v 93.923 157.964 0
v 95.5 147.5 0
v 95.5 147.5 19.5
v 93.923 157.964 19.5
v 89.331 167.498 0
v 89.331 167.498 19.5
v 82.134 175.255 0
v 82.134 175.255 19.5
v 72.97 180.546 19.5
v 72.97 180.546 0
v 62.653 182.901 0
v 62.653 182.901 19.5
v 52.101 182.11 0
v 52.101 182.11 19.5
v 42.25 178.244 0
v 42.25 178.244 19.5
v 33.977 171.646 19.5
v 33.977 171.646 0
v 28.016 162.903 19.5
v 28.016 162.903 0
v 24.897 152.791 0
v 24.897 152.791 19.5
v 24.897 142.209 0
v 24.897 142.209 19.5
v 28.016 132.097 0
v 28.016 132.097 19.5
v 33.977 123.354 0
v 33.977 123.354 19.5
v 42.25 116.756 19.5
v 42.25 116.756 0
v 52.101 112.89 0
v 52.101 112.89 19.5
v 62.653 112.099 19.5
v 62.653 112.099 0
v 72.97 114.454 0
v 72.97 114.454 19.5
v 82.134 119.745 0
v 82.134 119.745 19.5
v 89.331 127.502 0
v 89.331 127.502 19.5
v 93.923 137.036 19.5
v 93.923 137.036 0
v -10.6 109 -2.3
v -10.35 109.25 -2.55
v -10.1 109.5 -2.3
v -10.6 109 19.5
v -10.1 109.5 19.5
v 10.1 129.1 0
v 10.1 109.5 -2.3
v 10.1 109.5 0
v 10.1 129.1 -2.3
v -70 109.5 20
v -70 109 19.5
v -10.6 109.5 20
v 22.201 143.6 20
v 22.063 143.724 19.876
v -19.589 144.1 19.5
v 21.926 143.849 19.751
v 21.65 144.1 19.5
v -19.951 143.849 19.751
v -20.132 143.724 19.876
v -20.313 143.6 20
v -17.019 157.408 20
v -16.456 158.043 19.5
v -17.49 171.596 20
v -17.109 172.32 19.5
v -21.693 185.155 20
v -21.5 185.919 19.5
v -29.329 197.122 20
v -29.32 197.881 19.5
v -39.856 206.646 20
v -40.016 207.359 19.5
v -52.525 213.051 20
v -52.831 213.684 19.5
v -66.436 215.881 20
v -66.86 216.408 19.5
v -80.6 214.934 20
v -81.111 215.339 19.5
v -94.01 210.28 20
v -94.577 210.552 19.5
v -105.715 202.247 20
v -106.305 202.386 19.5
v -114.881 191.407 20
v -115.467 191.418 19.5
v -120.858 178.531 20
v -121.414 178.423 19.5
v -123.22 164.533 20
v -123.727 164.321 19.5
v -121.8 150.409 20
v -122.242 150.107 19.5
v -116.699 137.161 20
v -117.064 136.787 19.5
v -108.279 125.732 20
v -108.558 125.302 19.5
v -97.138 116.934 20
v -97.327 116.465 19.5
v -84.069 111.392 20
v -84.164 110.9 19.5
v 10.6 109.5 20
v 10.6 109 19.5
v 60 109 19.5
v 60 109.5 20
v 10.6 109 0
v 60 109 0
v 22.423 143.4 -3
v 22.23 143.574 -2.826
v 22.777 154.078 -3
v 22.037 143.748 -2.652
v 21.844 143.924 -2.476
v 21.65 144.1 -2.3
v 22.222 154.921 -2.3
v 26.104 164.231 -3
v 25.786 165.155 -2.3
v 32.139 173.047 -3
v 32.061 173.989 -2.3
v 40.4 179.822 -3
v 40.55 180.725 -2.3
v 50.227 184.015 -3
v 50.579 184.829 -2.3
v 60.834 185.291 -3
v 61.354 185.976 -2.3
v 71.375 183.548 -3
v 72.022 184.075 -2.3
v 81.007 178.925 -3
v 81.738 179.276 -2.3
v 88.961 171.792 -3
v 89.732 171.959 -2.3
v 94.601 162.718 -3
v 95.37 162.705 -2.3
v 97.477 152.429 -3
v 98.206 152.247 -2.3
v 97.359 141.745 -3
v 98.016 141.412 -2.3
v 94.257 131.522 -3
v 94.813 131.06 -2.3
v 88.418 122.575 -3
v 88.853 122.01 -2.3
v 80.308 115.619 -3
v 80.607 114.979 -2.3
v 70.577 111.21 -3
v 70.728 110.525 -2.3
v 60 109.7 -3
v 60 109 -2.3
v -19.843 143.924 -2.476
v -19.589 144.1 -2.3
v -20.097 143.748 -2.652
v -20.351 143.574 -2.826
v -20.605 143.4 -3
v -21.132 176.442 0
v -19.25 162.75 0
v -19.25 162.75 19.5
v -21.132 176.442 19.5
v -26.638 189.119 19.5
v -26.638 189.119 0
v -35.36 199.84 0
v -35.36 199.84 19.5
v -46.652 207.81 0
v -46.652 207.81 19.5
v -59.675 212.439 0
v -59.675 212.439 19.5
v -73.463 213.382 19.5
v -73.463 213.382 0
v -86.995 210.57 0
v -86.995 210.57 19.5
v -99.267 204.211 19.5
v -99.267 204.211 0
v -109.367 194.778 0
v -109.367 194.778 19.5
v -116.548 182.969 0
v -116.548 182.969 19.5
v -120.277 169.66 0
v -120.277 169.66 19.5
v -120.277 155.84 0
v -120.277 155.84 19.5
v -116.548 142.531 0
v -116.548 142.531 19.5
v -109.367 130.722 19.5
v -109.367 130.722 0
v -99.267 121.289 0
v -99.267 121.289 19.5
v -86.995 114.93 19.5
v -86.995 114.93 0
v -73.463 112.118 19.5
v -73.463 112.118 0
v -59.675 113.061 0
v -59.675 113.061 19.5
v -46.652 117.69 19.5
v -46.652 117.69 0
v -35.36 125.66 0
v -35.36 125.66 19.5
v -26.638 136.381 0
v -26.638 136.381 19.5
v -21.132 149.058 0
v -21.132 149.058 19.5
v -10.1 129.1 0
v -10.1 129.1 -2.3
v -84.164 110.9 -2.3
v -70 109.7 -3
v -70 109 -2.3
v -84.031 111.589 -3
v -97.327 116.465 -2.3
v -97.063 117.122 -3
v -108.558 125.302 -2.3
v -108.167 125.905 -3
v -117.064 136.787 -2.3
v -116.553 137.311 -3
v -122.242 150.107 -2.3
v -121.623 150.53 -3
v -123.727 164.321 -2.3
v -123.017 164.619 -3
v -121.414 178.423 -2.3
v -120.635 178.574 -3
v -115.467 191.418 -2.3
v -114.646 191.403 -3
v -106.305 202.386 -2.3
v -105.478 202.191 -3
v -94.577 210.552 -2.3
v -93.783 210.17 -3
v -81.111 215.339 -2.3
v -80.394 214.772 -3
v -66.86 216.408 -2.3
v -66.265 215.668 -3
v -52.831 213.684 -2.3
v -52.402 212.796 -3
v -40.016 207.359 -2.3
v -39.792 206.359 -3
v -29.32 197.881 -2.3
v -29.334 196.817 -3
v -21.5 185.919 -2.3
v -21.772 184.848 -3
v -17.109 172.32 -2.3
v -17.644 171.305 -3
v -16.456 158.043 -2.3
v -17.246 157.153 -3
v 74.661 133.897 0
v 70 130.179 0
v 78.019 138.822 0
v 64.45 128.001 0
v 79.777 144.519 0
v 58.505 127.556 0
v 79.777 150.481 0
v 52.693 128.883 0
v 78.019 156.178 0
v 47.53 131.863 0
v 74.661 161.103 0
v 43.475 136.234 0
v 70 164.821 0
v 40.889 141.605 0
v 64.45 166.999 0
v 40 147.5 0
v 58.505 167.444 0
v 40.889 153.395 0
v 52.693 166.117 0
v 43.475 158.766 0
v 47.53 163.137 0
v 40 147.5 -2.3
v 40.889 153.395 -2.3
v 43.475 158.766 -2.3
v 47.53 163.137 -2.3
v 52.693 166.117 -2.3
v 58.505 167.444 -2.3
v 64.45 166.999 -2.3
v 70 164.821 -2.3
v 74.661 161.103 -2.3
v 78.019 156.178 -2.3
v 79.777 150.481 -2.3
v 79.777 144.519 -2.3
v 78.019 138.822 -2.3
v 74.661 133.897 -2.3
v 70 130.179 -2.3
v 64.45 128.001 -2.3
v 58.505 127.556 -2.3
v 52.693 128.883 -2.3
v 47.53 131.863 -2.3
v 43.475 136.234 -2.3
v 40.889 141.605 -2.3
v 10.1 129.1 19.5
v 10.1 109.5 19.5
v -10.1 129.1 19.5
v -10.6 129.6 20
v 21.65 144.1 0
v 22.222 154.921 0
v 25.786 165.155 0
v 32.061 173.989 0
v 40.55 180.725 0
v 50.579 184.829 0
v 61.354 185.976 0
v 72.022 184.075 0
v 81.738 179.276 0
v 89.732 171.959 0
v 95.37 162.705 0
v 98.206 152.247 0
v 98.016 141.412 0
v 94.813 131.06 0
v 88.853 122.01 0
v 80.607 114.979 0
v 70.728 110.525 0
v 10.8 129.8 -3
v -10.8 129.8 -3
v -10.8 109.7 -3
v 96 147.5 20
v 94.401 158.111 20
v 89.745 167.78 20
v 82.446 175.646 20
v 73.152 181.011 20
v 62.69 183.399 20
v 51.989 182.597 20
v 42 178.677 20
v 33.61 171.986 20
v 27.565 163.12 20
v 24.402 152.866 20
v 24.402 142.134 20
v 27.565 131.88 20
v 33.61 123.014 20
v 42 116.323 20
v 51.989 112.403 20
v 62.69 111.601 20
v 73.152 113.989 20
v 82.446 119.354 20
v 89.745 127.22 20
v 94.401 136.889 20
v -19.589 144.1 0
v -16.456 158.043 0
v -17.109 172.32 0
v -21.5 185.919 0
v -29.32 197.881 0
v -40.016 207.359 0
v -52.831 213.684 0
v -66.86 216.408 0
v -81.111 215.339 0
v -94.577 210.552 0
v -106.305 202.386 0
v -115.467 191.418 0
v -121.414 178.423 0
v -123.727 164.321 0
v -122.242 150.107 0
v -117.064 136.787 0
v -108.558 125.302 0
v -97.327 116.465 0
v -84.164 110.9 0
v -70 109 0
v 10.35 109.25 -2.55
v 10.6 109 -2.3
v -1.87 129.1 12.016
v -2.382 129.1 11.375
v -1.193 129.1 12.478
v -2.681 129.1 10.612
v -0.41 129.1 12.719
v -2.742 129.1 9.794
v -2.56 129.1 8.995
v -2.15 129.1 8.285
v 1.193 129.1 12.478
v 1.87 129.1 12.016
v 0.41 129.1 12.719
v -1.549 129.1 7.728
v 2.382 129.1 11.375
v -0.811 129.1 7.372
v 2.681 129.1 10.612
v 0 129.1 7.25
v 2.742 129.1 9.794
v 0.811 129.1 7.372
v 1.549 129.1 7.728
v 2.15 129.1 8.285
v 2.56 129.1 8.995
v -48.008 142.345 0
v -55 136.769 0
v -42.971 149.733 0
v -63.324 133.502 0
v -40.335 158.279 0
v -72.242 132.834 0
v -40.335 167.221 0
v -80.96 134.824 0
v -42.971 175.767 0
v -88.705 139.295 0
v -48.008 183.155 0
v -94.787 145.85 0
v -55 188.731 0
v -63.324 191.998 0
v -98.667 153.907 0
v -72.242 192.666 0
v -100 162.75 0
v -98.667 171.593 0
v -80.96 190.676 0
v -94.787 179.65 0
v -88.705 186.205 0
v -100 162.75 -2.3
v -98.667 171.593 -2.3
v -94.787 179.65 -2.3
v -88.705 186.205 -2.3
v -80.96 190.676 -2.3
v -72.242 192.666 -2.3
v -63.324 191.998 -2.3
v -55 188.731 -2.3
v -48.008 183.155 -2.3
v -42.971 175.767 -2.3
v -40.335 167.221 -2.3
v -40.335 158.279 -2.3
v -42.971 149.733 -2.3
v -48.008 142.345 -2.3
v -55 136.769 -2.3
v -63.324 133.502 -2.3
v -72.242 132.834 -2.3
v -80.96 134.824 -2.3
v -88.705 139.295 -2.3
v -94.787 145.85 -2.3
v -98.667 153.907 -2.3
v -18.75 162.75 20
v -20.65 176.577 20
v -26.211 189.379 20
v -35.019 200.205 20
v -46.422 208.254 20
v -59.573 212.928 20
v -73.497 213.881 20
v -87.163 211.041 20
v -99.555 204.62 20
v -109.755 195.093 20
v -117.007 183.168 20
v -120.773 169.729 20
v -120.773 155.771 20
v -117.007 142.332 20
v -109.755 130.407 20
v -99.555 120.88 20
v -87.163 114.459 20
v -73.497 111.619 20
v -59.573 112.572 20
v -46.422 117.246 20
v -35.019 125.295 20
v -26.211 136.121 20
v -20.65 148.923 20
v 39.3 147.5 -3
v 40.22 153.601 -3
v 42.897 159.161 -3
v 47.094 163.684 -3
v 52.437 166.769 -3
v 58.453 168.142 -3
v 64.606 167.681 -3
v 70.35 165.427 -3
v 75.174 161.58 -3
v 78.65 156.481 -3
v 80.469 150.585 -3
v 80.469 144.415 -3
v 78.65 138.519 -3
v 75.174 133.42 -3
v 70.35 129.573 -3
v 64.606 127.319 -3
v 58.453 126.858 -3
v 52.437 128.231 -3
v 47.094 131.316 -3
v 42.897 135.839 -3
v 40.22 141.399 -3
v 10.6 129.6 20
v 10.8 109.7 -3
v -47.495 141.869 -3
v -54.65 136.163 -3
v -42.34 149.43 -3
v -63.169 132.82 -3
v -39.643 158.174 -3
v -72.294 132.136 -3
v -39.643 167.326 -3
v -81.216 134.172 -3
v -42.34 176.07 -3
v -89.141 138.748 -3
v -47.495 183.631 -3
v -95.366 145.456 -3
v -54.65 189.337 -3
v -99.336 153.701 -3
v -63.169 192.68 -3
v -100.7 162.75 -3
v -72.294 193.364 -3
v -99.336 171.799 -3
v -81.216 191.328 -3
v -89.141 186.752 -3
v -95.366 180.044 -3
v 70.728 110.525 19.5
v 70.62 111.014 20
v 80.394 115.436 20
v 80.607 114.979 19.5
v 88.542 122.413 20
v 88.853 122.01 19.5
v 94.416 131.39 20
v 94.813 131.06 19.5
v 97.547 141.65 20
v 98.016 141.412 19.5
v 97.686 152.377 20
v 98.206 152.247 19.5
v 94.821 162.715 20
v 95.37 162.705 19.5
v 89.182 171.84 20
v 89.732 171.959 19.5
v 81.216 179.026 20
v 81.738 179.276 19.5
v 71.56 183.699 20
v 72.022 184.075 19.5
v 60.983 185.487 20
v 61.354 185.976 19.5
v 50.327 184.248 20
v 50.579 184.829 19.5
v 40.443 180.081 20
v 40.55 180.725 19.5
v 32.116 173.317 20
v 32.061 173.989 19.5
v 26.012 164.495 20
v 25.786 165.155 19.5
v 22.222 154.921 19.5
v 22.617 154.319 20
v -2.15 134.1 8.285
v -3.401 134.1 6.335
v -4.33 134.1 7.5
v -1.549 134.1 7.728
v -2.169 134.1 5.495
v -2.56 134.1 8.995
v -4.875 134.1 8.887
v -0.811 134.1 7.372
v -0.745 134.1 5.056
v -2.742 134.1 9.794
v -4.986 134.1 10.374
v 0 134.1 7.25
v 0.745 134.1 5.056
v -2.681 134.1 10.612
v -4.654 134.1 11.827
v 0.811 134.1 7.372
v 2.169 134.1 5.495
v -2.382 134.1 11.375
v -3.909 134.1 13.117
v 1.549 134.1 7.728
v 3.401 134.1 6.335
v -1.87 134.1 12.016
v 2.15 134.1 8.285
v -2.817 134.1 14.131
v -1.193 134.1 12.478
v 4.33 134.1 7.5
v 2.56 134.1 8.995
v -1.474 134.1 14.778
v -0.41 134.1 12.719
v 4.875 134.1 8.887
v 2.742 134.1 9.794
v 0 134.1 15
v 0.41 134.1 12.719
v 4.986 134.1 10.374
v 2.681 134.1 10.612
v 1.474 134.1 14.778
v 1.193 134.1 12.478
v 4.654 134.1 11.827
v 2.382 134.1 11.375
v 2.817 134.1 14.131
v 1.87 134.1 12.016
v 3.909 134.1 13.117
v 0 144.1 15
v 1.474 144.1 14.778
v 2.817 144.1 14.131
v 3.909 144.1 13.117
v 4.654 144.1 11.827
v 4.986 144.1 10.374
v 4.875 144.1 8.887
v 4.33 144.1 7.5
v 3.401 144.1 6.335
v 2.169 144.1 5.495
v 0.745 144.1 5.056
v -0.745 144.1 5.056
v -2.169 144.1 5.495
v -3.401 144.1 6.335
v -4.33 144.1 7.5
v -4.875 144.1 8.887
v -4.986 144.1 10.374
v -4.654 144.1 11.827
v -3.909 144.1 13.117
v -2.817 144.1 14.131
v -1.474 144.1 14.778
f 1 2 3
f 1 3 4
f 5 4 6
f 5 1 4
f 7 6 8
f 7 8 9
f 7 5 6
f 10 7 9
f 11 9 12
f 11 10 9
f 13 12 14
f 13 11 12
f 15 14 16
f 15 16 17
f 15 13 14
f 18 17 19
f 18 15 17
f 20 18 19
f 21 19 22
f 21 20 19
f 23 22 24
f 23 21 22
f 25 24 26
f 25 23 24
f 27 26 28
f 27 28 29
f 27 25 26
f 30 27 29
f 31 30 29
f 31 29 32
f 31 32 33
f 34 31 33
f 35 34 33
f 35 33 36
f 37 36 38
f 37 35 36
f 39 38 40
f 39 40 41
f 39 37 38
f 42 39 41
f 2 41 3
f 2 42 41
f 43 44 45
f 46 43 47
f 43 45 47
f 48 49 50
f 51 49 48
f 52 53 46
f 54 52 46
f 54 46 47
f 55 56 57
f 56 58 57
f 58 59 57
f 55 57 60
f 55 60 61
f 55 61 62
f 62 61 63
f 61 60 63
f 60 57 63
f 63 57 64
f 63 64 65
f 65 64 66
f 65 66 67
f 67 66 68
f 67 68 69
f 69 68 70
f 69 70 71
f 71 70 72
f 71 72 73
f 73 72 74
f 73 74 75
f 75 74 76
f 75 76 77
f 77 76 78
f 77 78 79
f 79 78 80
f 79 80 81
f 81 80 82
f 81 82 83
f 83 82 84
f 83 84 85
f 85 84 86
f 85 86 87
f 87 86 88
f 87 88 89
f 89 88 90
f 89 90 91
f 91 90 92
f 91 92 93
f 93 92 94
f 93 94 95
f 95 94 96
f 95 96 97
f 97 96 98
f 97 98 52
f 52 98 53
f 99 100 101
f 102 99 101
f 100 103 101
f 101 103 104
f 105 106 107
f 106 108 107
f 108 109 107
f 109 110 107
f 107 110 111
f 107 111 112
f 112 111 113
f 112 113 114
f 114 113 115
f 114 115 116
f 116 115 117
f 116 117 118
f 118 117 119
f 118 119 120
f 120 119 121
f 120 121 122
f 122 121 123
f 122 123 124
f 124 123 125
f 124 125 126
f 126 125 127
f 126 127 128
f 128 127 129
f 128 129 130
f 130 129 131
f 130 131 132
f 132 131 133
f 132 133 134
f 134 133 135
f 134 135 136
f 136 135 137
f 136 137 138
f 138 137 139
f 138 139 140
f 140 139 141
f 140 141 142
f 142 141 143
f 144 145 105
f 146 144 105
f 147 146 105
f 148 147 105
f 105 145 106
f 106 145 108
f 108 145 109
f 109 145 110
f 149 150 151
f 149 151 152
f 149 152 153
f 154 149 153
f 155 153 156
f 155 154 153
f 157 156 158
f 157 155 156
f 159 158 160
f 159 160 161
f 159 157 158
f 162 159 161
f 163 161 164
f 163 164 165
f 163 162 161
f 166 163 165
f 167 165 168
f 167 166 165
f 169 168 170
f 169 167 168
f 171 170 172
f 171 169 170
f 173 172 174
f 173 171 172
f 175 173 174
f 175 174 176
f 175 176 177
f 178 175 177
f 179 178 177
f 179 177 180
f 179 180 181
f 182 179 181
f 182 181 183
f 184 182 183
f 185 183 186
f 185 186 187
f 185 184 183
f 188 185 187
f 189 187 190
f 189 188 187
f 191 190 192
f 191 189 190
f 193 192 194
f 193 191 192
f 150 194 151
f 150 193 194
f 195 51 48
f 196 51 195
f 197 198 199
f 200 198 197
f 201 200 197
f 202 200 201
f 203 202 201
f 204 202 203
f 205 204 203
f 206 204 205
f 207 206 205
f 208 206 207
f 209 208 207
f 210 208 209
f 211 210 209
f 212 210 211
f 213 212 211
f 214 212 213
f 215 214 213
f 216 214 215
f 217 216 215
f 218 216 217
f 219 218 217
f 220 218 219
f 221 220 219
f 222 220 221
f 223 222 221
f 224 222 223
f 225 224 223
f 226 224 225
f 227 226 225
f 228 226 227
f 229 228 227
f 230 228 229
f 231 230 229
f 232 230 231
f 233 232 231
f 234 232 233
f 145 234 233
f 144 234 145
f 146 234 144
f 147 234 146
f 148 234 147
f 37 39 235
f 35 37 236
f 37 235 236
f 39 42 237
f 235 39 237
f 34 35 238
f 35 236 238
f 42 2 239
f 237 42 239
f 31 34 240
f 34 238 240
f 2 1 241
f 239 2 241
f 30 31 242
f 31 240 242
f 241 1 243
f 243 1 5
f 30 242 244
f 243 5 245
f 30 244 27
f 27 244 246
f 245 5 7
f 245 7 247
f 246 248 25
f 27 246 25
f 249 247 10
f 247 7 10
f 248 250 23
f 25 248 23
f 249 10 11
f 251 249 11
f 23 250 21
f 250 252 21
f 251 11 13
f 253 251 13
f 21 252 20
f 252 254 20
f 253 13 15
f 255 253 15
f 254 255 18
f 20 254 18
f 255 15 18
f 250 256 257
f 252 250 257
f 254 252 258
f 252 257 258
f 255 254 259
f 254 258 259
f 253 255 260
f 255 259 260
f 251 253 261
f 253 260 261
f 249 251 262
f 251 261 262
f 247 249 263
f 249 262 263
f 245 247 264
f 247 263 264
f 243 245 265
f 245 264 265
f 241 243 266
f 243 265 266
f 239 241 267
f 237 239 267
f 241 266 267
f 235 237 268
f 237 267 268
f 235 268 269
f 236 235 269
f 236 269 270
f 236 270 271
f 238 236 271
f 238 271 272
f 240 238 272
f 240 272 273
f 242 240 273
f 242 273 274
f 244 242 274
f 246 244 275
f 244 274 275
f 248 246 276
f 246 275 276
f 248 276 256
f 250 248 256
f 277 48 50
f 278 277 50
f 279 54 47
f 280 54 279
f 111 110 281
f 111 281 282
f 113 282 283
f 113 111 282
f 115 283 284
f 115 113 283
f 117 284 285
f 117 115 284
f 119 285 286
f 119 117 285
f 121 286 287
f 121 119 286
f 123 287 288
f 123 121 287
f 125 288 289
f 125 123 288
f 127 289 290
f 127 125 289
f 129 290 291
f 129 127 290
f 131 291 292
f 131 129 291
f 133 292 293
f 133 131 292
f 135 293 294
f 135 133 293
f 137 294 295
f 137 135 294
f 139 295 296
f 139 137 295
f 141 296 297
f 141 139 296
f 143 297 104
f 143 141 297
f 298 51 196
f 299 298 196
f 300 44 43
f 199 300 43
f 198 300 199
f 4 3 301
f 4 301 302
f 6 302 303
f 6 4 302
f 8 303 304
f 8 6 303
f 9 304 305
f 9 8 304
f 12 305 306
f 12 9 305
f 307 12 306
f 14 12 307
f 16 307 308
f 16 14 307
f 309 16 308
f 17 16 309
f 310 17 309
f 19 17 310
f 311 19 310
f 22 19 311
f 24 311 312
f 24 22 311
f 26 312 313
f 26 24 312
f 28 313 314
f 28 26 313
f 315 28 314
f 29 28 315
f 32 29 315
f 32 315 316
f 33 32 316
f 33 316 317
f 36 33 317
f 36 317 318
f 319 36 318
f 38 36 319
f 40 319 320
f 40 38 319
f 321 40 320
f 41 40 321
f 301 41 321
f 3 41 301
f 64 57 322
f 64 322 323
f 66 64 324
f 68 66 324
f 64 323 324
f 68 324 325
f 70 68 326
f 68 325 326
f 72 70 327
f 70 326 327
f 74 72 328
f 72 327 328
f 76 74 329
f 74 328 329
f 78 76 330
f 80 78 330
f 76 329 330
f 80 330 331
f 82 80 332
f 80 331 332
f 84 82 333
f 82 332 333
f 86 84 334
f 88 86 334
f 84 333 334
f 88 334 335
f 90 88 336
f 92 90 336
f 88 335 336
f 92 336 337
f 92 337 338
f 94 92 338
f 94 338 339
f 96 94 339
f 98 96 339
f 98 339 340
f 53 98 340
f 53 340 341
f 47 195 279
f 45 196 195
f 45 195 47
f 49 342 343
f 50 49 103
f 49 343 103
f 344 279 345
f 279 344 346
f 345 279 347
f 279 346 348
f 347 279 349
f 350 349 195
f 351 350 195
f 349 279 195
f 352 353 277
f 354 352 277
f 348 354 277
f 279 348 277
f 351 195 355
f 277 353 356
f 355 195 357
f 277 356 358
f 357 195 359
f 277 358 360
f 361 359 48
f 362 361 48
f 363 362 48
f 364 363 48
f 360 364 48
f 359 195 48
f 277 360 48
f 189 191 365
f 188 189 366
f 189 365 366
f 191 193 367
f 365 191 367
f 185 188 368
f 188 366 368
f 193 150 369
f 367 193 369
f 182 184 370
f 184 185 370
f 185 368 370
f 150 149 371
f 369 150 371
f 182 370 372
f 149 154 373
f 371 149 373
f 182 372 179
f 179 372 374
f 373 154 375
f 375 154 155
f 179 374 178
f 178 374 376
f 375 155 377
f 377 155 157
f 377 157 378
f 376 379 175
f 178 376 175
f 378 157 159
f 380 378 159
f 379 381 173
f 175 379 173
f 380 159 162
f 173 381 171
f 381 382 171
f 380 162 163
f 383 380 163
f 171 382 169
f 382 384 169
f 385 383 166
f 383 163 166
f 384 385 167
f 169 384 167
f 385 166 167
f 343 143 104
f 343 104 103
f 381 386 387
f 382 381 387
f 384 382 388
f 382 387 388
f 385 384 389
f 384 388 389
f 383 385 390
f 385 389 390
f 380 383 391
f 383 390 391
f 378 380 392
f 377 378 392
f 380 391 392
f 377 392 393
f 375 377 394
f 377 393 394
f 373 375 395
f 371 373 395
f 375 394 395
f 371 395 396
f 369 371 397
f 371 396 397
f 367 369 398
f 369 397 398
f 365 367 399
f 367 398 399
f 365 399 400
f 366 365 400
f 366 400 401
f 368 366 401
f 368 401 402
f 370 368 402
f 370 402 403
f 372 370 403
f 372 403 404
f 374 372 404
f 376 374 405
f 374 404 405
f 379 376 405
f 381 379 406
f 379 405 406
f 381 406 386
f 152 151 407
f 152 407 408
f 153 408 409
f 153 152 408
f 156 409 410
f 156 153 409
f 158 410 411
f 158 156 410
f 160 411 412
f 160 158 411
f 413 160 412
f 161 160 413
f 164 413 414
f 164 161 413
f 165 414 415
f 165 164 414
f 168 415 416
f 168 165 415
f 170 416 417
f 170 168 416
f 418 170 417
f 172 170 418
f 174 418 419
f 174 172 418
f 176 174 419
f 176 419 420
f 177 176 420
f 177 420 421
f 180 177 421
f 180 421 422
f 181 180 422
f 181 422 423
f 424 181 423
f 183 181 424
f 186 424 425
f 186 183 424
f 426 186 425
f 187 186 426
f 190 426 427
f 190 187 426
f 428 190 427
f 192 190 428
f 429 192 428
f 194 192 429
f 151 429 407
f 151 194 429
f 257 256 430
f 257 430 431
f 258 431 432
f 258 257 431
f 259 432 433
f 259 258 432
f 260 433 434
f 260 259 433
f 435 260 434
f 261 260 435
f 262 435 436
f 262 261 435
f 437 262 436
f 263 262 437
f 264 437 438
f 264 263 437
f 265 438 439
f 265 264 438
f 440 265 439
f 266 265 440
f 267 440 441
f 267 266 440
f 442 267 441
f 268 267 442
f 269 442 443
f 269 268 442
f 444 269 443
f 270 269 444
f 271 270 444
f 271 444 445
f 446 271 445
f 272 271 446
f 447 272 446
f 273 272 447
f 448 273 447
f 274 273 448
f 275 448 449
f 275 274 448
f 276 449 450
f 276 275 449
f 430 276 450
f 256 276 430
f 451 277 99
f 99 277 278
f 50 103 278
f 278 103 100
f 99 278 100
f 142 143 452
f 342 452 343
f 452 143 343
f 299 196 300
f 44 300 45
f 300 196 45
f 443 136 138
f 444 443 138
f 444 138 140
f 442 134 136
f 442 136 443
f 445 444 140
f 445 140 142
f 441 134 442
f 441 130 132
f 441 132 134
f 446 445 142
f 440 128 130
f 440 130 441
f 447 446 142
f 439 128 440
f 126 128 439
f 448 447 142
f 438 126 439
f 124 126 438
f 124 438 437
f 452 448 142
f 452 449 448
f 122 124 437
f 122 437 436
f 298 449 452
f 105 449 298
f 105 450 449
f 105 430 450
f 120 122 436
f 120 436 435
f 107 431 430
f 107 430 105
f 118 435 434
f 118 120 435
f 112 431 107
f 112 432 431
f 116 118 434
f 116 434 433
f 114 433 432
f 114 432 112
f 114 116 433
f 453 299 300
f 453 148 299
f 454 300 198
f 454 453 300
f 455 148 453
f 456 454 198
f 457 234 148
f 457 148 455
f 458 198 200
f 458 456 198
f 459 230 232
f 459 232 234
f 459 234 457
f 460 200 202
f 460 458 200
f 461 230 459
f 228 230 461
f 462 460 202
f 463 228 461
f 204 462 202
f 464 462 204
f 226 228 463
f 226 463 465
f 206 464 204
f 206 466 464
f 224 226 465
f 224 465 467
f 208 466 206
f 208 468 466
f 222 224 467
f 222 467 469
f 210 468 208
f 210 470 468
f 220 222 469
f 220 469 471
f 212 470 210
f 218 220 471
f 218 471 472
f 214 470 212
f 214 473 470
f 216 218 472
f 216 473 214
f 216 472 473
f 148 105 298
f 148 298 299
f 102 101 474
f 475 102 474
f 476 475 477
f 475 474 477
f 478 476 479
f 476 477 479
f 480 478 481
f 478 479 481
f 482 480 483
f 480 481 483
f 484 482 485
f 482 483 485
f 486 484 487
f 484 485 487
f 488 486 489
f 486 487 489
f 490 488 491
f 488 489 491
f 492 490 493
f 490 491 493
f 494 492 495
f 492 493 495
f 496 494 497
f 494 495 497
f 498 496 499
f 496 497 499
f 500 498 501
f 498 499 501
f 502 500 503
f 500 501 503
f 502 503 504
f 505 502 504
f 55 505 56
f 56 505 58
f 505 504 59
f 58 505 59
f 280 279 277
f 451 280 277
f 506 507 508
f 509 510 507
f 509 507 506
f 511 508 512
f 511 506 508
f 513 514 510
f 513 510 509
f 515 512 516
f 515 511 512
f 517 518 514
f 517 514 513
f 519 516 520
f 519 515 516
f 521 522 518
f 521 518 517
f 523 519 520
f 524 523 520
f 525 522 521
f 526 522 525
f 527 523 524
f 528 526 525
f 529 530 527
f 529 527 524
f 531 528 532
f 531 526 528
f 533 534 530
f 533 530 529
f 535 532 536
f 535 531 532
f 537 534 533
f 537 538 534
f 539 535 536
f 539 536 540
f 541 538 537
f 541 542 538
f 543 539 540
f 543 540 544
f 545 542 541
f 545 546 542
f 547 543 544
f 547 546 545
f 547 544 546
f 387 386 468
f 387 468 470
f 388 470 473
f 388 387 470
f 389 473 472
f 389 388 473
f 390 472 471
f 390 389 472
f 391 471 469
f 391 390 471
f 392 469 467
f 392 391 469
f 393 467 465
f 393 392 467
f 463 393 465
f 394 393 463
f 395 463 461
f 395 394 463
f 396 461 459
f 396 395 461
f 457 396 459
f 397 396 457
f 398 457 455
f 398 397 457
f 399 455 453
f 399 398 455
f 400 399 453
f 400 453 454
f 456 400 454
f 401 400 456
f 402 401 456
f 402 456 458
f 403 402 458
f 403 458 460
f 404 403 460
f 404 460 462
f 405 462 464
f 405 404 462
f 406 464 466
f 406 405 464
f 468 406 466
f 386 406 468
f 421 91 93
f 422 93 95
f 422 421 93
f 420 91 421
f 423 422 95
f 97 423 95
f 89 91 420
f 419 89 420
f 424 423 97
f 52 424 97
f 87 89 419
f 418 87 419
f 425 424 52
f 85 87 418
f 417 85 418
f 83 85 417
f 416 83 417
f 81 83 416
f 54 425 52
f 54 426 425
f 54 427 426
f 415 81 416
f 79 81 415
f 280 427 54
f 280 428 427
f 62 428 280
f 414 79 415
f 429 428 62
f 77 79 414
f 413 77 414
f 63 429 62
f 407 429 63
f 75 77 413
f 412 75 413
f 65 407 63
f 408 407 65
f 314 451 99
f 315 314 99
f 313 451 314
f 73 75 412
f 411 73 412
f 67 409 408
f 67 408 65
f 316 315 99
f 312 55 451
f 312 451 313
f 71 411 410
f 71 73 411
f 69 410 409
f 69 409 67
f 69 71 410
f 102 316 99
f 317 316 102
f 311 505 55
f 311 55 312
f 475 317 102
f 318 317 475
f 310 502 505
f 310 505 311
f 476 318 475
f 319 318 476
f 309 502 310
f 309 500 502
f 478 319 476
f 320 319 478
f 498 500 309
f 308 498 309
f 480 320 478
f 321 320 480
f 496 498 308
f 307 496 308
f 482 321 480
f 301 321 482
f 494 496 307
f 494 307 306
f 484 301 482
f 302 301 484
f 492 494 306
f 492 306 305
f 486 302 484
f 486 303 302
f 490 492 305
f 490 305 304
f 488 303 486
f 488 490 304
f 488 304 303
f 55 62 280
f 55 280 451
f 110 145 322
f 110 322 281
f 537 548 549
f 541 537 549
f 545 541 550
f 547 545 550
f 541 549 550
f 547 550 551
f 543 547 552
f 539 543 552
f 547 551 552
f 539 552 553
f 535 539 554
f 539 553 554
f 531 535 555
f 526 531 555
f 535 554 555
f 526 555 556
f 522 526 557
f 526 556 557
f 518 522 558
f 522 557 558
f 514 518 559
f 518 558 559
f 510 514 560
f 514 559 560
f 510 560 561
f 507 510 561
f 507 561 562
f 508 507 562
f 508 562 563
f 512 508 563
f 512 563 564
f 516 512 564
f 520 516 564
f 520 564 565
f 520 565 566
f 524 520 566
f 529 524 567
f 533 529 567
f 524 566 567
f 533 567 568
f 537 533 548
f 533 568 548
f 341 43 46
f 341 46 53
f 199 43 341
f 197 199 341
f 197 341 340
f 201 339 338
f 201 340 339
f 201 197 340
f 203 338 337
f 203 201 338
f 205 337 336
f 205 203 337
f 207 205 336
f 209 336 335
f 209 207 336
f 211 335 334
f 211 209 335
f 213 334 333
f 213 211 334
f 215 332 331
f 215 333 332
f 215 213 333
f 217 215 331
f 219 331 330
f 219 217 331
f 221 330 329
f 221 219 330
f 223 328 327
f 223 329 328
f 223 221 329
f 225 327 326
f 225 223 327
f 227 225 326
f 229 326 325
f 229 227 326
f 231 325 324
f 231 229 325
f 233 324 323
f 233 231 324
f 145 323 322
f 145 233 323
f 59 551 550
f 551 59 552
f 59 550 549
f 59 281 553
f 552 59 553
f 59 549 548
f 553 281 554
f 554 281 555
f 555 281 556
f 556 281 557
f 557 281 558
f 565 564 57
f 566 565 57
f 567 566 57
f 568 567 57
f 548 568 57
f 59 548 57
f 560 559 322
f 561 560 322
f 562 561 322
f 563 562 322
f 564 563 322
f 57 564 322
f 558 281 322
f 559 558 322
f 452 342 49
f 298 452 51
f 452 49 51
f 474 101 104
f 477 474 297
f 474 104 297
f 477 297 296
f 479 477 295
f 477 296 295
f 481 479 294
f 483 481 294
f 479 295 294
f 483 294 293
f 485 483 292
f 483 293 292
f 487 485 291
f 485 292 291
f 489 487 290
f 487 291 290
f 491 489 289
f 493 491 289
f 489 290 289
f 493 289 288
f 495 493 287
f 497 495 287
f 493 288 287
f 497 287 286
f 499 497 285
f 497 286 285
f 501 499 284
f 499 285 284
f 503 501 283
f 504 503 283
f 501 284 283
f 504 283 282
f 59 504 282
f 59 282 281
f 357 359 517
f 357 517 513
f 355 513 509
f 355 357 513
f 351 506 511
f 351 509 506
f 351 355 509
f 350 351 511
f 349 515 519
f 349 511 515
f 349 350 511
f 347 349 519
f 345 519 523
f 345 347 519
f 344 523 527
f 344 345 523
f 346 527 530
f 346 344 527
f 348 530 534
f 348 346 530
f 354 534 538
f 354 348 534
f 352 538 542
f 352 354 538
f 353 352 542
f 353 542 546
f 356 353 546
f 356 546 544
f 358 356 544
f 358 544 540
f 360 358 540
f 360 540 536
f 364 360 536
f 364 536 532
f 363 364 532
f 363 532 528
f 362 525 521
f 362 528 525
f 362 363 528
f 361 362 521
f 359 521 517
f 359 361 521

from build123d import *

# Parameters (mm, degrees)
SKETCH2_R           = 50.75
SKETCH2_R_2         = 35.5
BOSS_EXTRUDE1_DEPTH = 20
SKETCH3_R           = 2.75
CUT_EXTRUDE1_DEPTH  = 251.172565442
SKETCH4_R           = 5
CUT_EXTRUDE2_DEPTH  = 10
BOSS_EXTRUDE2_START = 3
SKETCH5_R           = 20
SKETCH5_R_2         = 30
BOSS_EXTRUDE2_DEPTH = 3
CHAMFER1_SIZE       = 0.7
CHAMFER2_SIZE       = 0.5


with BuildPart() as part:
    # Sketch2 → Boss-Extrude1 (new body)
    with BuildSketch(Plane.XY):
        with BuildLine():
            Line((-10.1, 109), (-10.1, 129.1))
            Line((-10.1, 129.1), (10.1, 129.1))
            Line((10.1, 129.1), (10.1, 109))
            Line((10.1, 109), (60, 109))
            ThreePointArc((60, 109), (85.993749249, 175.900264083), (21.650423731, 144.1))
            Line((21.650423731, 144.1), (-19.589286853, 144.1))
            ThreePointArc((-19.589286853, 144.1), (-100.713392844, 206.860656309), (-70, 109))
            Line((-70, 109), (-10.1, 109))
        make_face()
        with Locations((-70, 162.75)):
            Circle(SKETCH2_R, mode=Mode.SUBTRACT)
        with Locations((60, 147.5)):
            Circle(SKETCH2_R_2, mode=Mode.SUBTRACT)
    extrude(amount=BOSS_EXTRUDE1_DEPTH)

    # Sketch3 → Cut-Extrude1 (cut, through all)
    with BuildSketch(Plane(origin=(0, 0, 0), x_dir=(1, 0, 0), z_dir=(0, 1, 0))):
        with Locations(Location((0, -10, 0), (0, 0, 90))):
            Circle(SKETCH3_R)
    extrude(amount=CUT_EXTRUDE1_DEPTH, mode=Mode.SUBTRACT)

    # Sketch4 → Cut-Extrude2 (cut)
    with BuildSketch(Plane(origin=(0, 144.1, 0), x_dir=(1, 0, 0), z_dir=(0, 1, 0))):
        with Locations(Location((0, -10, 0), (0, 0, 270))):
            Circle(SKETCH4_R)
    extrude(amount=-CUT_EXTRUDE2_DEPTH, mode=Mode.SUBTRACT)

    # Sketch5 → Boss-Extrude2 (add)
    with BuildSketch(Plane(origin=(0, 0, 0), x_dir=(-1, 0, 0), z_dir=(0, 0, -1)).offset(BOSS_EXTRUDE2_START)):
        with BuildLine():
            Line((10.1, 109), (70, 109))
            ThreePointArc((70, 109), (100.713392844, 206.860656309), (19.589286853, 144.1))
            Line((19.589286853, 144.1), (-21.650423731, 144.1))
            ThreePointArc((-21.650423731, 144.1), (-85.993749249, 175.900264083), (-60, 109))
            Line((-60, 109), (-10.1, 109))
            Line((-10.1, 109), (-10.1, 129.1))
            Line((-10.1, 129.1), (10.1, 129.1))
            Line((10.1, 129.1), (10.1, 109))
        make_face()
        with Locations((-60, 147.5)):
            Circle(SKETCH5_R, mode=Mode.SUBTRACT)
        with Locations((70, 162.75)):
            Circle(SKETCH5_R_2, mode=Mode.SUBTRACT)
    extrude(amount=-BOSS_EXTRUDE2_DEPTH)

    # Chamfer1
    chamfer1_edges = [part.edges().sort_by_distance(p)[0] for p in [
        (-10.1, 119.05, -3),
        (-40.05, 109, -3),
        (-100.713392844, 206.860656309, -3),
        (1.030568439, 144.1, -3),
        (85.993749249, 175.900264083, -3),
        (35.05, 109, -3),
        (10.1, 119.05, -3),
        (0, 129.1, -3),
        (80, 147.5, -3),
        (-40, 162.75, -3),
    ]]
    chamfer(chamfer1_edges, length=CHAMFER1_SIZE)

    # Chamfer2
    chamfer2_edges = [part.edges().sort_by_distance(p)[0] for p in [
        (0, 129.1, 20),
        (10.1, 109, 10),
        (-10.1, 109, 8.85),
        (10.1, 119.05, 20),
        (35.05, 109, 20),
        (-120.75, 162.75, 20),
        (85.993749249, 175.900264083, 20),
        (24.5, 147.5, 20),
        (1.030568439, 144.1, 20),
        (-100.713392844, 206.860656309, 20),
        (-40.05, 109, 20),
        (-10.1, 119.05, 20),
    ]]
    chamfer(chamfer2_edges, length=CHAMFER2_SIZE)


solid = part.part
